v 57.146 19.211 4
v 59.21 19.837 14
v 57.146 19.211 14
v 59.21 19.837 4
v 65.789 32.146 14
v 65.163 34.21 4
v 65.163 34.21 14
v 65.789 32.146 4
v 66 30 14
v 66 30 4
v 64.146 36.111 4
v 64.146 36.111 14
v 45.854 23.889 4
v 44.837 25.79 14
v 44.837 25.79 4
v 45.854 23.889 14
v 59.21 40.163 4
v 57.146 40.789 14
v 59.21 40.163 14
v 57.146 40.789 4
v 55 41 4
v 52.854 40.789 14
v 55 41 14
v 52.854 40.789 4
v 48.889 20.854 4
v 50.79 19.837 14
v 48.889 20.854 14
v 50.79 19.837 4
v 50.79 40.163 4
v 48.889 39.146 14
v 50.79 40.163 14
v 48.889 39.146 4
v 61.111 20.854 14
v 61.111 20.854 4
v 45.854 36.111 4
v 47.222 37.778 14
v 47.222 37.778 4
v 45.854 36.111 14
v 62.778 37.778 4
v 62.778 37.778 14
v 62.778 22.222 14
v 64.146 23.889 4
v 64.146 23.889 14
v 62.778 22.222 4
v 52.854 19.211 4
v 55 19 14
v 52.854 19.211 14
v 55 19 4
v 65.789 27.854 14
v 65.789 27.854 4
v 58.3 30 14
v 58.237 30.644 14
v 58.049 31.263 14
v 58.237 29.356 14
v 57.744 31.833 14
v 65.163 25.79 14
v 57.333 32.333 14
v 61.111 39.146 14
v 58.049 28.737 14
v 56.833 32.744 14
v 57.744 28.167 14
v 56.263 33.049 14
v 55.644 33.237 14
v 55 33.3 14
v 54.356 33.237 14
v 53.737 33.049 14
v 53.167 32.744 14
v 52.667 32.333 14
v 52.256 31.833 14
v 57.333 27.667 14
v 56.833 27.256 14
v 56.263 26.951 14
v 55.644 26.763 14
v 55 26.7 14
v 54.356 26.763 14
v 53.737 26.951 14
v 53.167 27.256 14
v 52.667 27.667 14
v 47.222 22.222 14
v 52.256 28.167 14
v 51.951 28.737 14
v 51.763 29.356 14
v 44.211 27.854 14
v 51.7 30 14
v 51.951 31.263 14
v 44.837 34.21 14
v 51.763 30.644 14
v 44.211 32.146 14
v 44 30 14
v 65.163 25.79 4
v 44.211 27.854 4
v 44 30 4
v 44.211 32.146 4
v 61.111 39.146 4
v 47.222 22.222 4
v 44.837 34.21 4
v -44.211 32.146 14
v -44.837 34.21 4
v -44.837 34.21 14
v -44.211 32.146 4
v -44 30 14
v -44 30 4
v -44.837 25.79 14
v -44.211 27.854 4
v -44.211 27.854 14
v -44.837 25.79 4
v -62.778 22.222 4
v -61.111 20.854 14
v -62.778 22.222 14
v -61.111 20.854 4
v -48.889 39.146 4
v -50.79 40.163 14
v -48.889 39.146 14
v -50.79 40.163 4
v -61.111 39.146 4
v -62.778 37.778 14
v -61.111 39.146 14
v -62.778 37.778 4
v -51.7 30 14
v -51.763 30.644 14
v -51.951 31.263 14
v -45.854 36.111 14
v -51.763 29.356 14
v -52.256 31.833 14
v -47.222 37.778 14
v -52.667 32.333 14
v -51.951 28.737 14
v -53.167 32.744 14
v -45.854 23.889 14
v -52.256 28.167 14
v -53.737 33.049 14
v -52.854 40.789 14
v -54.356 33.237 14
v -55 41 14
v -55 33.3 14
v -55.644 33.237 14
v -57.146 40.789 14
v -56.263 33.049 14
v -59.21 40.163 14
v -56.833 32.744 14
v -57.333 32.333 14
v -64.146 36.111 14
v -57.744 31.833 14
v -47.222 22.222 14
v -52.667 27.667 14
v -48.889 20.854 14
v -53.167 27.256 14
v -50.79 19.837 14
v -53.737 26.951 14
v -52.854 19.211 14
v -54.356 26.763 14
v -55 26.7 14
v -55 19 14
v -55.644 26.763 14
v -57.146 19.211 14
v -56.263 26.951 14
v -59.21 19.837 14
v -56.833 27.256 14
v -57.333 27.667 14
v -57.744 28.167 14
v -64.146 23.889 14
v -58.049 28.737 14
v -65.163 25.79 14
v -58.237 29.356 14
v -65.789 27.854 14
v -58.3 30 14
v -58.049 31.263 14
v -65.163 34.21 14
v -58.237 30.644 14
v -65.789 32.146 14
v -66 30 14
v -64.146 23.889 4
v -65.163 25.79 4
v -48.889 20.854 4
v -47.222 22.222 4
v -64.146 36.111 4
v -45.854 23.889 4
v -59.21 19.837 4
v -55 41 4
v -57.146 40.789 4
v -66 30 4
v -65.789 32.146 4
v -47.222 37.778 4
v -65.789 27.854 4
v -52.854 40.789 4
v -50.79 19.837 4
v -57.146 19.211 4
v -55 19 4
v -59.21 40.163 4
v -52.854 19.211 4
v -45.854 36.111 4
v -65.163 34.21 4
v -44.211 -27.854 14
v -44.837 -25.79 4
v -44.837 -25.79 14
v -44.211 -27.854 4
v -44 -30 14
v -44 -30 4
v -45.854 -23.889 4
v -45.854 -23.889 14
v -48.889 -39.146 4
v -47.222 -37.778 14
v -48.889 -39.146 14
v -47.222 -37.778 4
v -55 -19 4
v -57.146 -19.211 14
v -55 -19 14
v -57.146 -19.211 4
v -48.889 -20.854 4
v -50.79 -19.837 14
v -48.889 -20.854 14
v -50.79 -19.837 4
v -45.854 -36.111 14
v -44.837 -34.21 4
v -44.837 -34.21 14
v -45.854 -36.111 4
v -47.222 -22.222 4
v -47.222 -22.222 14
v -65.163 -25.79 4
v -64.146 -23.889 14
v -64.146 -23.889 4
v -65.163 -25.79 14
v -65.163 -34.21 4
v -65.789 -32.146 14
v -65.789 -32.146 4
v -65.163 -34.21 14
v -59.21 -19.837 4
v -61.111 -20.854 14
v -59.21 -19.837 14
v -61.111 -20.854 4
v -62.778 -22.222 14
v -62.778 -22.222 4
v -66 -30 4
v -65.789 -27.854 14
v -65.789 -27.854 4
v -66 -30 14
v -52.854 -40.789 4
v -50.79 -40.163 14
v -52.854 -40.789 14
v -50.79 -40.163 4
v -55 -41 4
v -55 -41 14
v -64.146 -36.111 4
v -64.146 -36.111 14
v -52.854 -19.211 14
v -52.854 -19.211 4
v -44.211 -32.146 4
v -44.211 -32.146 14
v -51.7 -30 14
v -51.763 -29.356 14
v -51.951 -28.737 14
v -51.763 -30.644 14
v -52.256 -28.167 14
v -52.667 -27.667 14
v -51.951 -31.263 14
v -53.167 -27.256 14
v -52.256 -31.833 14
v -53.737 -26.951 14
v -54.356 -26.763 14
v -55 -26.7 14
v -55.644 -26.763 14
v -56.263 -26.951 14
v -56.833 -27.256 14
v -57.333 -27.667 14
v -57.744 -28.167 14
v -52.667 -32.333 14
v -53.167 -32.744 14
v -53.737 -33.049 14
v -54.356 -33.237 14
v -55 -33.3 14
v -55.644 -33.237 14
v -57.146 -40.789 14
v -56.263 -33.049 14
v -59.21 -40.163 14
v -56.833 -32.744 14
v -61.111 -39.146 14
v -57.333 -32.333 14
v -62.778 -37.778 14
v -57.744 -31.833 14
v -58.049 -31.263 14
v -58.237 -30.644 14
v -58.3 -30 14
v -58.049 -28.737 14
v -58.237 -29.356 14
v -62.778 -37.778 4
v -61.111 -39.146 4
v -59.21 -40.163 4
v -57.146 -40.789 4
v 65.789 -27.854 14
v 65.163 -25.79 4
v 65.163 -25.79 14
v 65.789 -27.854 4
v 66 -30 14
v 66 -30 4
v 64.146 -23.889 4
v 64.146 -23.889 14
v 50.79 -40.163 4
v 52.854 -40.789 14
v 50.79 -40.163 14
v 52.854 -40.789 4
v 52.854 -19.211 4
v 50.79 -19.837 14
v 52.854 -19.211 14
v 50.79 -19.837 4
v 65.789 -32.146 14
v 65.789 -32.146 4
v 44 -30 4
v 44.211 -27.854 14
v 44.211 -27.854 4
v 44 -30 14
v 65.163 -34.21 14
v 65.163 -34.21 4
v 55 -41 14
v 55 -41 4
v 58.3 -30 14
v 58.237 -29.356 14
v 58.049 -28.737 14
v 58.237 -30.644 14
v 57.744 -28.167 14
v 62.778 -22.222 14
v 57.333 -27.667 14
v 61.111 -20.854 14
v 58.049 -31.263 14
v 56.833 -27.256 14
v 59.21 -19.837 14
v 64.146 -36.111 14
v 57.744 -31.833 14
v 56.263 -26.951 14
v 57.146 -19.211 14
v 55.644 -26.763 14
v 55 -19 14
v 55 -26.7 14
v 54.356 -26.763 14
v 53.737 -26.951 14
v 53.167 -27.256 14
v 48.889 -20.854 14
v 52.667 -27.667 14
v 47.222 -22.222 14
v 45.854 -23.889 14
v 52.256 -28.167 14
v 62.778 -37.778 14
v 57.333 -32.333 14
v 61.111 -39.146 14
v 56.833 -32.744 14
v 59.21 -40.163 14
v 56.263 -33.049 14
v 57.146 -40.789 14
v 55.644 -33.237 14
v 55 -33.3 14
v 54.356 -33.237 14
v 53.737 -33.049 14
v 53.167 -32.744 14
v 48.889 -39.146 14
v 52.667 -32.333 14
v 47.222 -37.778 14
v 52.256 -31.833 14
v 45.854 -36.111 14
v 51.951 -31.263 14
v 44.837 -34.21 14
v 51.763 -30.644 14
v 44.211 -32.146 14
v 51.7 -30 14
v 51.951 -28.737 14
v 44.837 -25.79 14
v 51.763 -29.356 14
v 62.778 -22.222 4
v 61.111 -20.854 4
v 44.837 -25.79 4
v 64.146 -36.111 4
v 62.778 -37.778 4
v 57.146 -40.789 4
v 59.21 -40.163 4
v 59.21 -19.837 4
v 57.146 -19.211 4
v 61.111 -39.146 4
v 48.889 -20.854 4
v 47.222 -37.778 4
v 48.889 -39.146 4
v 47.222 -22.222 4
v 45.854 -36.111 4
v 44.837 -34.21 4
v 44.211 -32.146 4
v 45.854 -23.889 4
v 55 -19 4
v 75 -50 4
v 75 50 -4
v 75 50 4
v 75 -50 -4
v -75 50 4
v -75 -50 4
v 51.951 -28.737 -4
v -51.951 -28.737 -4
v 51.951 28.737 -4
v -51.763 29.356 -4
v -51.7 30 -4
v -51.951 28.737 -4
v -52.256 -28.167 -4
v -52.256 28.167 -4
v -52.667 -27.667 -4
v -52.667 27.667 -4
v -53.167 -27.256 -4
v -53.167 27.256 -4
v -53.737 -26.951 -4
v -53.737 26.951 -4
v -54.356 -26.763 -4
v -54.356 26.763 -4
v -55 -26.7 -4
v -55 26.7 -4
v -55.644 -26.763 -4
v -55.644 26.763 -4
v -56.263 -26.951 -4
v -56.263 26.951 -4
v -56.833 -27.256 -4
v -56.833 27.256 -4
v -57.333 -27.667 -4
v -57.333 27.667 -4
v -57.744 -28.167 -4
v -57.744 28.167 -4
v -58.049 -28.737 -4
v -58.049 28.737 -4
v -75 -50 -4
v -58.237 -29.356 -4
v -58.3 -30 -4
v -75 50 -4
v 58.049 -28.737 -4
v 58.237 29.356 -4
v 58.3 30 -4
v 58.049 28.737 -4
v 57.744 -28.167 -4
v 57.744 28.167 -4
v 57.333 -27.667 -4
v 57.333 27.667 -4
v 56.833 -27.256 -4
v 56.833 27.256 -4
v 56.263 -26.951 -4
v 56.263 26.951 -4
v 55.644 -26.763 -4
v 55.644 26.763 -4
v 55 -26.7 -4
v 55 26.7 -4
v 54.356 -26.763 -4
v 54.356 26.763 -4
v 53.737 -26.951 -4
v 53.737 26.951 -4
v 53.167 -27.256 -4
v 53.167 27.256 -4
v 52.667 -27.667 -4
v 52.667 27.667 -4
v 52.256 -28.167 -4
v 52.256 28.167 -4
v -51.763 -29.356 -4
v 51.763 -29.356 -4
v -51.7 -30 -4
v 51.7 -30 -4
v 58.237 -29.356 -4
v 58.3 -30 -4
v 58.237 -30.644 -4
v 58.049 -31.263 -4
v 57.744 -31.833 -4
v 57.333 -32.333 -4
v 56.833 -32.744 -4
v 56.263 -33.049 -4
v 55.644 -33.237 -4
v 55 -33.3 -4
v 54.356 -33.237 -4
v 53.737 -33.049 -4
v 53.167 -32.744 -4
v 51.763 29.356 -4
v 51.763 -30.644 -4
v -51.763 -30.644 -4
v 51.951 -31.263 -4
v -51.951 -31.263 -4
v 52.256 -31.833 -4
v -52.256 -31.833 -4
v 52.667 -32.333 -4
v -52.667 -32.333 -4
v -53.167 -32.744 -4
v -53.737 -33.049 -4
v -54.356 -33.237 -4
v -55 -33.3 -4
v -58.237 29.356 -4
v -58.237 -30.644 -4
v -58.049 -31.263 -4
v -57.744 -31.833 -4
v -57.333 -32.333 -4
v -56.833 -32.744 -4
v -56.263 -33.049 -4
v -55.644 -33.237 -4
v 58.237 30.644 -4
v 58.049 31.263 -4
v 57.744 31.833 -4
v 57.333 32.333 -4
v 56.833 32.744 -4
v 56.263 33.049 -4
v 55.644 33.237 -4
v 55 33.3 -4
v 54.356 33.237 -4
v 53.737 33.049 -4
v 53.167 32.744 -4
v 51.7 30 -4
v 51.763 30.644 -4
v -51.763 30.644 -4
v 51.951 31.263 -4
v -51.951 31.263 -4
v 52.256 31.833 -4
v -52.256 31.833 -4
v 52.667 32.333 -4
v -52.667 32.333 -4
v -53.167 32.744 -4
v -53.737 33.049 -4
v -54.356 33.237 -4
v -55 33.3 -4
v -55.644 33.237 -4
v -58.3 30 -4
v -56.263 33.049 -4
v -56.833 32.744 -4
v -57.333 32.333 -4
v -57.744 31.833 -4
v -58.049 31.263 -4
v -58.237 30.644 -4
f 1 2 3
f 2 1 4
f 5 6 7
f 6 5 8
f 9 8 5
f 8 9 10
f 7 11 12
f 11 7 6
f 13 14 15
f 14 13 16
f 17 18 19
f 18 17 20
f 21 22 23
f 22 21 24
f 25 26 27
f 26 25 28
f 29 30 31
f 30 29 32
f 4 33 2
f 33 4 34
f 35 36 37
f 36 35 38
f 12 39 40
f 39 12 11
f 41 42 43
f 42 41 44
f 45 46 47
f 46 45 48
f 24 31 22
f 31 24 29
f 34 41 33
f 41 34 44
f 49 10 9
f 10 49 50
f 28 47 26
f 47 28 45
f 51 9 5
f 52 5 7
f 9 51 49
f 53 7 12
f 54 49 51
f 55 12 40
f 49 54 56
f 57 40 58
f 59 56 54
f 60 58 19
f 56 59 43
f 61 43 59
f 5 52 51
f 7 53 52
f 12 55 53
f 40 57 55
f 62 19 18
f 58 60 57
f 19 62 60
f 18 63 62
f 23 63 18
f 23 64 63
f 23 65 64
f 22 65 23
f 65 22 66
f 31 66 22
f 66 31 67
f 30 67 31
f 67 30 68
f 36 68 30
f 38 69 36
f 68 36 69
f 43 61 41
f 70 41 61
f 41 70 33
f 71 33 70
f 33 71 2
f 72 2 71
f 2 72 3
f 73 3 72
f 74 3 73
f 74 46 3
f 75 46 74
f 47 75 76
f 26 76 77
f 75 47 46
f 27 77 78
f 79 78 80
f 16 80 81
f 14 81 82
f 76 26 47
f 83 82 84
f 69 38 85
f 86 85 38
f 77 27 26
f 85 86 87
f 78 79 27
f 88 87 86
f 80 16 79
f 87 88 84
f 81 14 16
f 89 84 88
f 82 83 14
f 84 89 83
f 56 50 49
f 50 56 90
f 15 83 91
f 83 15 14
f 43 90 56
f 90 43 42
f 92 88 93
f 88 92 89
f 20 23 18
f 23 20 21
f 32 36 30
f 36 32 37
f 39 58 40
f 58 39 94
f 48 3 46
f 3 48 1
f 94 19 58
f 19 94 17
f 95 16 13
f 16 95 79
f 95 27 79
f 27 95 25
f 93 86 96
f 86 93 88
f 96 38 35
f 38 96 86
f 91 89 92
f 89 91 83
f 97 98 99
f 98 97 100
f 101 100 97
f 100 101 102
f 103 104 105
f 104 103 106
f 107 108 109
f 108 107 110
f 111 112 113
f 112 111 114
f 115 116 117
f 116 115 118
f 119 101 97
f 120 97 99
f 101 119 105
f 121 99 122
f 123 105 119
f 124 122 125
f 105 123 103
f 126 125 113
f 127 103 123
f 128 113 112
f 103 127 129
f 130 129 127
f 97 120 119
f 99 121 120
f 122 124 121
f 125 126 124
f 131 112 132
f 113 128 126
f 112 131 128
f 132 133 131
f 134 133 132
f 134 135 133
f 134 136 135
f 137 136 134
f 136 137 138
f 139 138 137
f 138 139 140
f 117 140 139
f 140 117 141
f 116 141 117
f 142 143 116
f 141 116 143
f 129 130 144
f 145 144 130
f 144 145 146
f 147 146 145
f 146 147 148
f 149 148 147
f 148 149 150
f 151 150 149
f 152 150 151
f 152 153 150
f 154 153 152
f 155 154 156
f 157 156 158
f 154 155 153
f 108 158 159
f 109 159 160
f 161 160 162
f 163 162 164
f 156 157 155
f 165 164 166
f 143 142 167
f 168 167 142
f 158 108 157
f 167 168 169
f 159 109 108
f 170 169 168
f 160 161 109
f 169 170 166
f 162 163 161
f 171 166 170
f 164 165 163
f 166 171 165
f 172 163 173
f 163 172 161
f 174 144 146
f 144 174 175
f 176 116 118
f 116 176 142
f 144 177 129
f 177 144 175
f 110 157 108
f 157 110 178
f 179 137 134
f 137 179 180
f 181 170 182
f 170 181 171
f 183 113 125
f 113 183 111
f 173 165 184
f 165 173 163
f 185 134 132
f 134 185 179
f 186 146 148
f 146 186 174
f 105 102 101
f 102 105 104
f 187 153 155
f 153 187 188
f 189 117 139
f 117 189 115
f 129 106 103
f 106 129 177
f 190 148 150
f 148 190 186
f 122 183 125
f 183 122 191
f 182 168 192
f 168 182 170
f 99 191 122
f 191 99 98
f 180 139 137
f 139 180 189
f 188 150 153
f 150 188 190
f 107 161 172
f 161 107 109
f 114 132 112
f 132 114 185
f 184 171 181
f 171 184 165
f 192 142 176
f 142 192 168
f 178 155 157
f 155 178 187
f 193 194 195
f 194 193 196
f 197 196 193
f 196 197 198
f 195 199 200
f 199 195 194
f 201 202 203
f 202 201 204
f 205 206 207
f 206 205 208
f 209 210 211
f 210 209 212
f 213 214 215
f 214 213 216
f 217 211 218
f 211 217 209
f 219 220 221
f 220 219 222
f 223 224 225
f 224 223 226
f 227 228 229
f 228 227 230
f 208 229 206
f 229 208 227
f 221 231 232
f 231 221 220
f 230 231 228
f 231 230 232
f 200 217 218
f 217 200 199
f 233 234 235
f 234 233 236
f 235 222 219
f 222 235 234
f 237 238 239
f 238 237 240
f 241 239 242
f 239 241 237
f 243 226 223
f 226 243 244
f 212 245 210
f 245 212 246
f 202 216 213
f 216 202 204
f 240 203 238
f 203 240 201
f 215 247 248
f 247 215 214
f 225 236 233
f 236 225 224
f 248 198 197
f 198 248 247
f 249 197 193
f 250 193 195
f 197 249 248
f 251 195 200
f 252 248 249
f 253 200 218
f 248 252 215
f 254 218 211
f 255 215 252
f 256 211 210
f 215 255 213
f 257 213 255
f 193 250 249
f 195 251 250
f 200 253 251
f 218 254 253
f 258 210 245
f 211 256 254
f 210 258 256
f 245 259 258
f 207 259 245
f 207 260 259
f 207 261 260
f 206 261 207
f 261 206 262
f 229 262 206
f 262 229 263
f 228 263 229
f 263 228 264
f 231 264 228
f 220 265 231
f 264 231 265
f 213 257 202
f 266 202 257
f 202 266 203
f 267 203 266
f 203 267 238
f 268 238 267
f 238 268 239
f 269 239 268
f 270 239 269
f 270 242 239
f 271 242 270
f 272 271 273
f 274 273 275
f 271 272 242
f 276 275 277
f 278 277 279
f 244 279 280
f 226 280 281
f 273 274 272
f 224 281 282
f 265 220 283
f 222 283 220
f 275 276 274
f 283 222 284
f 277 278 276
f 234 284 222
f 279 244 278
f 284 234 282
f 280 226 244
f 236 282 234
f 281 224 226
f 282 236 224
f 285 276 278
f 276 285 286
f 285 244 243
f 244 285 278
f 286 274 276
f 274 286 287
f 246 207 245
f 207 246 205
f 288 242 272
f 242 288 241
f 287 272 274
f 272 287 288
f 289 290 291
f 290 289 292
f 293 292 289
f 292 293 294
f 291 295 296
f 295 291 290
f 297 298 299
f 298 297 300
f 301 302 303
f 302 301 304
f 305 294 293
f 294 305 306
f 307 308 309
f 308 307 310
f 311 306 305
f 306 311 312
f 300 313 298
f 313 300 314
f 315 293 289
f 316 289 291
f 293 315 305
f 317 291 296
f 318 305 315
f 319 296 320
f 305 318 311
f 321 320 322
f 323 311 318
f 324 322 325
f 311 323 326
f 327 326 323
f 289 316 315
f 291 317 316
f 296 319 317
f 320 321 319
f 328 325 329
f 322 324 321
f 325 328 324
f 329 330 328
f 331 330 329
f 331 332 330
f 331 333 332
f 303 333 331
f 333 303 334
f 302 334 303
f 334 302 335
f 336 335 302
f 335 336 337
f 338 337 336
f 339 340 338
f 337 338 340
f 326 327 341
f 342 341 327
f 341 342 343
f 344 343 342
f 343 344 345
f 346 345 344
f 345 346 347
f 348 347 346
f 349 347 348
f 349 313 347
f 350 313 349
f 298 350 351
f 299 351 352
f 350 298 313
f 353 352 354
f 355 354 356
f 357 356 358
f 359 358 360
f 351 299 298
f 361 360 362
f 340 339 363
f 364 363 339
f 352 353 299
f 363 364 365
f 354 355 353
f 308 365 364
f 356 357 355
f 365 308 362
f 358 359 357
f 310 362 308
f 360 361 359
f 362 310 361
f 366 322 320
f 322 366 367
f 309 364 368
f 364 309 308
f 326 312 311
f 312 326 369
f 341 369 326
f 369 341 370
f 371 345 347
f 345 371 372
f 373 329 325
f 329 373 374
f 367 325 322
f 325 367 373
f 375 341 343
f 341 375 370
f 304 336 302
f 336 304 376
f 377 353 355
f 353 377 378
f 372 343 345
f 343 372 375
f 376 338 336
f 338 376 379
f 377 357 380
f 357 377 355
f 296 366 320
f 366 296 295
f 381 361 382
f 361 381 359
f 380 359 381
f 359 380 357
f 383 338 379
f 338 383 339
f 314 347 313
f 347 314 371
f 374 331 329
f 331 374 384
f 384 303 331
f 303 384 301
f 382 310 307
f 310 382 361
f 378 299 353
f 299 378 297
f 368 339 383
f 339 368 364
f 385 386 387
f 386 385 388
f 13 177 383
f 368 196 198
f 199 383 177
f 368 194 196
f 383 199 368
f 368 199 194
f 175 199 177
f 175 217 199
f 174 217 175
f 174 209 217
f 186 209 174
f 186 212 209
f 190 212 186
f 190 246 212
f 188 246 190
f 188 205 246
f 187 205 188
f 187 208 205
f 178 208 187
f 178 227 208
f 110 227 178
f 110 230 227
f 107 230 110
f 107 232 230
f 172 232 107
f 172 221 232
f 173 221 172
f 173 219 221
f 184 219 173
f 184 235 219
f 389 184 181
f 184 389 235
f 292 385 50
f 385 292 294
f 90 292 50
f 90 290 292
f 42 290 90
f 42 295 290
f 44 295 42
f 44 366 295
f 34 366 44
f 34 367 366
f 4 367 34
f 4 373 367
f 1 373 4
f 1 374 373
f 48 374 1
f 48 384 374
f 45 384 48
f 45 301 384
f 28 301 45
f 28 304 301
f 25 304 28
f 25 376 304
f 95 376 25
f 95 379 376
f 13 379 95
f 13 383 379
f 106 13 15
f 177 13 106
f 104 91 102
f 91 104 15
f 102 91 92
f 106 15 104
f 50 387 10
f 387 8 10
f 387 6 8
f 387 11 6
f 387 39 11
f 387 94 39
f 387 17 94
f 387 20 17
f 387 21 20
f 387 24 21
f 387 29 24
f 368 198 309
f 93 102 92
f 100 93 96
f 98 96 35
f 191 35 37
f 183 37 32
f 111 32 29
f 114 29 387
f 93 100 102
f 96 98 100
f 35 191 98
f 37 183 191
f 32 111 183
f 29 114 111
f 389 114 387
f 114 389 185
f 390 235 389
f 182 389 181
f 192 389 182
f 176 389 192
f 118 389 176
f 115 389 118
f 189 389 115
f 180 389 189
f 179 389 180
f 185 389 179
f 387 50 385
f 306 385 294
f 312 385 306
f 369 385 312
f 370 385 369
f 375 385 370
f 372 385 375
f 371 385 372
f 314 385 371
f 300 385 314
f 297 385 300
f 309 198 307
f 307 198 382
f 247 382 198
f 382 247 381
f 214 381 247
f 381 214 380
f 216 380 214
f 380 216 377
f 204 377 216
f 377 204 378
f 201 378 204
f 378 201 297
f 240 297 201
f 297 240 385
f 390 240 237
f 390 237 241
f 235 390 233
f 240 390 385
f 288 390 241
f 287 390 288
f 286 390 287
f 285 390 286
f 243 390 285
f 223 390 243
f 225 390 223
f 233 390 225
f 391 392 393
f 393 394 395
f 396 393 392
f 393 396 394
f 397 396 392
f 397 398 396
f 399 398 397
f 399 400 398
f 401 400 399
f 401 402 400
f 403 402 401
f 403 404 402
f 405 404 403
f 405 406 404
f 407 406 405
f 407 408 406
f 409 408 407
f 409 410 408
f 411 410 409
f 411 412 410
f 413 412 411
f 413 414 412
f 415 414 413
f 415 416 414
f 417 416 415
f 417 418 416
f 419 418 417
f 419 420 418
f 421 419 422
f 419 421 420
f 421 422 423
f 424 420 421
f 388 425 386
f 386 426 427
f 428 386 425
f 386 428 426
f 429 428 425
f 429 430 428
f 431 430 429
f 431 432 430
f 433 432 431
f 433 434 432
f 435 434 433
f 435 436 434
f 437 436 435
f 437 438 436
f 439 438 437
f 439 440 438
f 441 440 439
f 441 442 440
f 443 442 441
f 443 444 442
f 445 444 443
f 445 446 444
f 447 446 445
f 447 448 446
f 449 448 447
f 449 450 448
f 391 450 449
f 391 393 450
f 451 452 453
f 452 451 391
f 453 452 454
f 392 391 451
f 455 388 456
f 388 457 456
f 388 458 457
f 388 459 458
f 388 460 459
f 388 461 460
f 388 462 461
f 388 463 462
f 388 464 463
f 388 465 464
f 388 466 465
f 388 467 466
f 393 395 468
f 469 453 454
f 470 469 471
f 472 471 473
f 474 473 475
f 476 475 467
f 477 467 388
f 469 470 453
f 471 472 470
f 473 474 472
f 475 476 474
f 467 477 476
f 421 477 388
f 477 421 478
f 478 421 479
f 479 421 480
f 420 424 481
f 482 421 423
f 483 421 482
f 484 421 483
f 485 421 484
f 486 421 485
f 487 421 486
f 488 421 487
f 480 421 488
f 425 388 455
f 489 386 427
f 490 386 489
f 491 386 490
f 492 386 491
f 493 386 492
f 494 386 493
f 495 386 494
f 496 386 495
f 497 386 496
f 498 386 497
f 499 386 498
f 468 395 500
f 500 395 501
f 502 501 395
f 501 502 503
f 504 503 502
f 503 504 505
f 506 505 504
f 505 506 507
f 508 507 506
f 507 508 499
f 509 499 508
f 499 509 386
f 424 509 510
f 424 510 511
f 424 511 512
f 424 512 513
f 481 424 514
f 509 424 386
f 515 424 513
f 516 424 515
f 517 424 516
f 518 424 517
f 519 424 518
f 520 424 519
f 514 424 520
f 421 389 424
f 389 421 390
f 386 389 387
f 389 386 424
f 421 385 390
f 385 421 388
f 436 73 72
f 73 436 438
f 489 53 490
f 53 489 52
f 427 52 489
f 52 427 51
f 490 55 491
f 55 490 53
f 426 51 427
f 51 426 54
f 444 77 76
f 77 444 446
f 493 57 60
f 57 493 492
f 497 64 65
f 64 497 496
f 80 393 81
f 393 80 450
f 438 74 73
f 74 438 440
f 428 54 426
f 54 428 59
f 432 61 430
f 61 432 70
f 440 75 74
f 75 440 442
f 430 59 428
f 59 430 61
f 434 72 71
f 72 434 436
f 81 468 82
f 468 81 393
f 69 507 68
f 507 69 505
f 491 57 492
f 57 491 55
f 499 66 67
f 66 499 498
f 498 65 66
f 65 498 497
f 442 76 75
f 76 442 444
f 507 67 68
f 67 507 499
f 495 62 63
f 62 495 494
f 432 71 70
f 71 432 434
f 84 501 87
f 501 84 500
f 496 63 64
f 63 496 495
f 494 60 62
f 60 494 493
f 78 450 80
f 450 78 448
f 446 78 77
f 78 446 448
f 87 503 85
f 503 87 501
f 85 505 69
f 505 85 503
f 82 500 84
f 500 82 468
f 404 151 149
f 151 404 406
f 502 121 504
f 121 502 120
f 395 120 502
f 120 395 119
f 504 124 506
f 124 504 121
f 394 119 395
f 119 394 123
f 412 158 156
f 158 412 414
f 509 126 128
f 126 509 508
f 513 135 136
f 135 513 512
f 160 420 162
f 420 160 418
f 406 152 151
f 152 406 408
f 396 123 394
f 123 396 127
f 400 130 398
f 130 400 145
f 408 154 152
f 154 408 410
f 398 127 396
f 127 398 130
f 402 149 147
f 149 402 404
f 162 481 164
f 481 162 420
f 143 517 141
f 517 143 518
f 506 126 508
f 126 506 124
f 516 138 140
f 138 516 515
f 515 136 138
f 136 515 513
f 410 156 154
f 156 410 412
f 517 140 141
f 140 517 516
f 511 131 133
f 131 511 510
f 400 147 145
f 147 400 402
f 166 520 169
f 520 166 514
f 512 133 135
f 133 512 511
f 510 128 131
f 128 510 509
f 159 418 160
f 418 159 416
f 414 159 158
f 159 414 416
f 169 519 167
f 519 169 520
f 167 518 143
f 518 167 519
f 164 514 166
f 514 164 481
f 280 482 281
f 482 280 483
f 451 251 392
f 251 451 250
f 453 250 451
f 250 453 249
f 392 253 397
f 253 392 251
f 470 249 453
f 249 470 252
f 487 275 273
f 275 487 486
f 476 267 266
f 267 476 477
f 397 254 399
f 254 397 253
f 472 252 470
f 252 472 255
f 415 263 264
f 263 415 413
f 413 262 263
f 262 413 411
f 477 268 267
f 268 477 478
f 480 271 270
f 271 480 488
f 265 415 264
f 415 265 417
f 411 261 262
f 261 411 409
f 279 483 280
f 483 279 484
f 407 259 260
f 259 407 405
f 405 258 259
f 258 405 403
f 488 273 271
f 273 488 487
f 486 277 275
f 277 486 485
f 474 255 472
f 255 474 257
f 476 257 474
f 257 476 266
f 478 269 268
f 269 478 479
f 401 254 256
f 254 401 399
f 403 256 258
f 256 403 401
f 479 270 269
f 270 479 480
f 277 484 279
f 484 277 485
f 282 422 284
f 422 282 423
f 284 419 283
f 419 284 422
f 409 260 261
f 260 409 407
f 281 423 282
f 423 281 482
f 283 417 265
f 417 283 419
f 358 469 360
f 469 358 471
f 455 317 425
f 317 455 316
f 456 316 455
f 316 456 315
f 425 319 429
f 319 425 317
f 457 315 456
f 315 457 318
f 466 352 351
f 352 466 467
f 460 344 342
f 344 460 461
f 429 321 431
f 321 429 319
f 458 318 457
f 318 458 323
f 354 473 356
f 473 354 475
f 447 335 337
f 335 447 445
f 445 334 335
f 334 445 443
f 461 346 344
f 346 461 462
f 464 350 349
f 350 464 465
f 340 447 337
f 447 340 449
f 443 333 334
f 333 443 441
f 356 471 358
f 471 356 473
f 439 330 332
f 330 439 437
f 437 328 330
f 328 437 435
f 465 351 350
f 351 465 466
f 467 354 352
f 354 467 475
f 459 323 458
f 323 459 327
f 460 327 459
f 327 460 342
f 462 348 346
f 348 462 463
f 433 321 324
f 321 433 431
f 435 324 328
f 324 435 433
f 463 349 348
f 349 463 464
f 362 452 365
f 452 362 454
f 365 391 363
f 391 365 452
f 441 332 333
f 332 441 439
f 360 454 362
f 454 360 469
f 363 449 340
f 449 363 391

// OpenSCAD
$fn = 32;

// ----------------------------------------------------------------------
// Anchor pads 150 x 100 x 18
// four corner bosses with anchor holes
// ----------------------------------------------------------------------

// --- parameters (mm) ---
plate = [150, 100, 8];  // base plate size (x, y, z)
pads = 4;               // boss count, one per corner
edge = 20;              // boss centre offset from the plate edge
boss_d = 22;            // boss diameter
boss_h = 10;            // boss height above the base plate
hole_d = 6.6;           // hole diameter

// --- derived feature positions (mm) ---
height = plate[2] + boss_h;      // = 18   overall height of the part
corner_x = plate[0] / 2 - edge;  // = 55   boss centre X
corner_y = plate[1] / 2 - edge;  // = 30   boss centre Y
feature_centers = [
  [corner_x, corner_y],
  [-corner_x, corner_y],
  [-corner_x, -corner_y],
  [corner_x, -corner_y]
];   // boss centres, anchor holes are drilled there

// base plate, four bosses standing on it, anchor holes all the way through
difference() {
  union() {
    cube(plate, center = true);
    for (centre = feature_centers)
      translate([centre[0], centre[1], plate[2] / 2 - 1])
        cylinder(d = boss_d, h = boss_h + 1);
  }
  for (centre = feature_centers)
    translate([centre[0], centre[1], -height])
      cylinder(d = hole_d, h = 2 * height + 2);  // through boss and plate
}
